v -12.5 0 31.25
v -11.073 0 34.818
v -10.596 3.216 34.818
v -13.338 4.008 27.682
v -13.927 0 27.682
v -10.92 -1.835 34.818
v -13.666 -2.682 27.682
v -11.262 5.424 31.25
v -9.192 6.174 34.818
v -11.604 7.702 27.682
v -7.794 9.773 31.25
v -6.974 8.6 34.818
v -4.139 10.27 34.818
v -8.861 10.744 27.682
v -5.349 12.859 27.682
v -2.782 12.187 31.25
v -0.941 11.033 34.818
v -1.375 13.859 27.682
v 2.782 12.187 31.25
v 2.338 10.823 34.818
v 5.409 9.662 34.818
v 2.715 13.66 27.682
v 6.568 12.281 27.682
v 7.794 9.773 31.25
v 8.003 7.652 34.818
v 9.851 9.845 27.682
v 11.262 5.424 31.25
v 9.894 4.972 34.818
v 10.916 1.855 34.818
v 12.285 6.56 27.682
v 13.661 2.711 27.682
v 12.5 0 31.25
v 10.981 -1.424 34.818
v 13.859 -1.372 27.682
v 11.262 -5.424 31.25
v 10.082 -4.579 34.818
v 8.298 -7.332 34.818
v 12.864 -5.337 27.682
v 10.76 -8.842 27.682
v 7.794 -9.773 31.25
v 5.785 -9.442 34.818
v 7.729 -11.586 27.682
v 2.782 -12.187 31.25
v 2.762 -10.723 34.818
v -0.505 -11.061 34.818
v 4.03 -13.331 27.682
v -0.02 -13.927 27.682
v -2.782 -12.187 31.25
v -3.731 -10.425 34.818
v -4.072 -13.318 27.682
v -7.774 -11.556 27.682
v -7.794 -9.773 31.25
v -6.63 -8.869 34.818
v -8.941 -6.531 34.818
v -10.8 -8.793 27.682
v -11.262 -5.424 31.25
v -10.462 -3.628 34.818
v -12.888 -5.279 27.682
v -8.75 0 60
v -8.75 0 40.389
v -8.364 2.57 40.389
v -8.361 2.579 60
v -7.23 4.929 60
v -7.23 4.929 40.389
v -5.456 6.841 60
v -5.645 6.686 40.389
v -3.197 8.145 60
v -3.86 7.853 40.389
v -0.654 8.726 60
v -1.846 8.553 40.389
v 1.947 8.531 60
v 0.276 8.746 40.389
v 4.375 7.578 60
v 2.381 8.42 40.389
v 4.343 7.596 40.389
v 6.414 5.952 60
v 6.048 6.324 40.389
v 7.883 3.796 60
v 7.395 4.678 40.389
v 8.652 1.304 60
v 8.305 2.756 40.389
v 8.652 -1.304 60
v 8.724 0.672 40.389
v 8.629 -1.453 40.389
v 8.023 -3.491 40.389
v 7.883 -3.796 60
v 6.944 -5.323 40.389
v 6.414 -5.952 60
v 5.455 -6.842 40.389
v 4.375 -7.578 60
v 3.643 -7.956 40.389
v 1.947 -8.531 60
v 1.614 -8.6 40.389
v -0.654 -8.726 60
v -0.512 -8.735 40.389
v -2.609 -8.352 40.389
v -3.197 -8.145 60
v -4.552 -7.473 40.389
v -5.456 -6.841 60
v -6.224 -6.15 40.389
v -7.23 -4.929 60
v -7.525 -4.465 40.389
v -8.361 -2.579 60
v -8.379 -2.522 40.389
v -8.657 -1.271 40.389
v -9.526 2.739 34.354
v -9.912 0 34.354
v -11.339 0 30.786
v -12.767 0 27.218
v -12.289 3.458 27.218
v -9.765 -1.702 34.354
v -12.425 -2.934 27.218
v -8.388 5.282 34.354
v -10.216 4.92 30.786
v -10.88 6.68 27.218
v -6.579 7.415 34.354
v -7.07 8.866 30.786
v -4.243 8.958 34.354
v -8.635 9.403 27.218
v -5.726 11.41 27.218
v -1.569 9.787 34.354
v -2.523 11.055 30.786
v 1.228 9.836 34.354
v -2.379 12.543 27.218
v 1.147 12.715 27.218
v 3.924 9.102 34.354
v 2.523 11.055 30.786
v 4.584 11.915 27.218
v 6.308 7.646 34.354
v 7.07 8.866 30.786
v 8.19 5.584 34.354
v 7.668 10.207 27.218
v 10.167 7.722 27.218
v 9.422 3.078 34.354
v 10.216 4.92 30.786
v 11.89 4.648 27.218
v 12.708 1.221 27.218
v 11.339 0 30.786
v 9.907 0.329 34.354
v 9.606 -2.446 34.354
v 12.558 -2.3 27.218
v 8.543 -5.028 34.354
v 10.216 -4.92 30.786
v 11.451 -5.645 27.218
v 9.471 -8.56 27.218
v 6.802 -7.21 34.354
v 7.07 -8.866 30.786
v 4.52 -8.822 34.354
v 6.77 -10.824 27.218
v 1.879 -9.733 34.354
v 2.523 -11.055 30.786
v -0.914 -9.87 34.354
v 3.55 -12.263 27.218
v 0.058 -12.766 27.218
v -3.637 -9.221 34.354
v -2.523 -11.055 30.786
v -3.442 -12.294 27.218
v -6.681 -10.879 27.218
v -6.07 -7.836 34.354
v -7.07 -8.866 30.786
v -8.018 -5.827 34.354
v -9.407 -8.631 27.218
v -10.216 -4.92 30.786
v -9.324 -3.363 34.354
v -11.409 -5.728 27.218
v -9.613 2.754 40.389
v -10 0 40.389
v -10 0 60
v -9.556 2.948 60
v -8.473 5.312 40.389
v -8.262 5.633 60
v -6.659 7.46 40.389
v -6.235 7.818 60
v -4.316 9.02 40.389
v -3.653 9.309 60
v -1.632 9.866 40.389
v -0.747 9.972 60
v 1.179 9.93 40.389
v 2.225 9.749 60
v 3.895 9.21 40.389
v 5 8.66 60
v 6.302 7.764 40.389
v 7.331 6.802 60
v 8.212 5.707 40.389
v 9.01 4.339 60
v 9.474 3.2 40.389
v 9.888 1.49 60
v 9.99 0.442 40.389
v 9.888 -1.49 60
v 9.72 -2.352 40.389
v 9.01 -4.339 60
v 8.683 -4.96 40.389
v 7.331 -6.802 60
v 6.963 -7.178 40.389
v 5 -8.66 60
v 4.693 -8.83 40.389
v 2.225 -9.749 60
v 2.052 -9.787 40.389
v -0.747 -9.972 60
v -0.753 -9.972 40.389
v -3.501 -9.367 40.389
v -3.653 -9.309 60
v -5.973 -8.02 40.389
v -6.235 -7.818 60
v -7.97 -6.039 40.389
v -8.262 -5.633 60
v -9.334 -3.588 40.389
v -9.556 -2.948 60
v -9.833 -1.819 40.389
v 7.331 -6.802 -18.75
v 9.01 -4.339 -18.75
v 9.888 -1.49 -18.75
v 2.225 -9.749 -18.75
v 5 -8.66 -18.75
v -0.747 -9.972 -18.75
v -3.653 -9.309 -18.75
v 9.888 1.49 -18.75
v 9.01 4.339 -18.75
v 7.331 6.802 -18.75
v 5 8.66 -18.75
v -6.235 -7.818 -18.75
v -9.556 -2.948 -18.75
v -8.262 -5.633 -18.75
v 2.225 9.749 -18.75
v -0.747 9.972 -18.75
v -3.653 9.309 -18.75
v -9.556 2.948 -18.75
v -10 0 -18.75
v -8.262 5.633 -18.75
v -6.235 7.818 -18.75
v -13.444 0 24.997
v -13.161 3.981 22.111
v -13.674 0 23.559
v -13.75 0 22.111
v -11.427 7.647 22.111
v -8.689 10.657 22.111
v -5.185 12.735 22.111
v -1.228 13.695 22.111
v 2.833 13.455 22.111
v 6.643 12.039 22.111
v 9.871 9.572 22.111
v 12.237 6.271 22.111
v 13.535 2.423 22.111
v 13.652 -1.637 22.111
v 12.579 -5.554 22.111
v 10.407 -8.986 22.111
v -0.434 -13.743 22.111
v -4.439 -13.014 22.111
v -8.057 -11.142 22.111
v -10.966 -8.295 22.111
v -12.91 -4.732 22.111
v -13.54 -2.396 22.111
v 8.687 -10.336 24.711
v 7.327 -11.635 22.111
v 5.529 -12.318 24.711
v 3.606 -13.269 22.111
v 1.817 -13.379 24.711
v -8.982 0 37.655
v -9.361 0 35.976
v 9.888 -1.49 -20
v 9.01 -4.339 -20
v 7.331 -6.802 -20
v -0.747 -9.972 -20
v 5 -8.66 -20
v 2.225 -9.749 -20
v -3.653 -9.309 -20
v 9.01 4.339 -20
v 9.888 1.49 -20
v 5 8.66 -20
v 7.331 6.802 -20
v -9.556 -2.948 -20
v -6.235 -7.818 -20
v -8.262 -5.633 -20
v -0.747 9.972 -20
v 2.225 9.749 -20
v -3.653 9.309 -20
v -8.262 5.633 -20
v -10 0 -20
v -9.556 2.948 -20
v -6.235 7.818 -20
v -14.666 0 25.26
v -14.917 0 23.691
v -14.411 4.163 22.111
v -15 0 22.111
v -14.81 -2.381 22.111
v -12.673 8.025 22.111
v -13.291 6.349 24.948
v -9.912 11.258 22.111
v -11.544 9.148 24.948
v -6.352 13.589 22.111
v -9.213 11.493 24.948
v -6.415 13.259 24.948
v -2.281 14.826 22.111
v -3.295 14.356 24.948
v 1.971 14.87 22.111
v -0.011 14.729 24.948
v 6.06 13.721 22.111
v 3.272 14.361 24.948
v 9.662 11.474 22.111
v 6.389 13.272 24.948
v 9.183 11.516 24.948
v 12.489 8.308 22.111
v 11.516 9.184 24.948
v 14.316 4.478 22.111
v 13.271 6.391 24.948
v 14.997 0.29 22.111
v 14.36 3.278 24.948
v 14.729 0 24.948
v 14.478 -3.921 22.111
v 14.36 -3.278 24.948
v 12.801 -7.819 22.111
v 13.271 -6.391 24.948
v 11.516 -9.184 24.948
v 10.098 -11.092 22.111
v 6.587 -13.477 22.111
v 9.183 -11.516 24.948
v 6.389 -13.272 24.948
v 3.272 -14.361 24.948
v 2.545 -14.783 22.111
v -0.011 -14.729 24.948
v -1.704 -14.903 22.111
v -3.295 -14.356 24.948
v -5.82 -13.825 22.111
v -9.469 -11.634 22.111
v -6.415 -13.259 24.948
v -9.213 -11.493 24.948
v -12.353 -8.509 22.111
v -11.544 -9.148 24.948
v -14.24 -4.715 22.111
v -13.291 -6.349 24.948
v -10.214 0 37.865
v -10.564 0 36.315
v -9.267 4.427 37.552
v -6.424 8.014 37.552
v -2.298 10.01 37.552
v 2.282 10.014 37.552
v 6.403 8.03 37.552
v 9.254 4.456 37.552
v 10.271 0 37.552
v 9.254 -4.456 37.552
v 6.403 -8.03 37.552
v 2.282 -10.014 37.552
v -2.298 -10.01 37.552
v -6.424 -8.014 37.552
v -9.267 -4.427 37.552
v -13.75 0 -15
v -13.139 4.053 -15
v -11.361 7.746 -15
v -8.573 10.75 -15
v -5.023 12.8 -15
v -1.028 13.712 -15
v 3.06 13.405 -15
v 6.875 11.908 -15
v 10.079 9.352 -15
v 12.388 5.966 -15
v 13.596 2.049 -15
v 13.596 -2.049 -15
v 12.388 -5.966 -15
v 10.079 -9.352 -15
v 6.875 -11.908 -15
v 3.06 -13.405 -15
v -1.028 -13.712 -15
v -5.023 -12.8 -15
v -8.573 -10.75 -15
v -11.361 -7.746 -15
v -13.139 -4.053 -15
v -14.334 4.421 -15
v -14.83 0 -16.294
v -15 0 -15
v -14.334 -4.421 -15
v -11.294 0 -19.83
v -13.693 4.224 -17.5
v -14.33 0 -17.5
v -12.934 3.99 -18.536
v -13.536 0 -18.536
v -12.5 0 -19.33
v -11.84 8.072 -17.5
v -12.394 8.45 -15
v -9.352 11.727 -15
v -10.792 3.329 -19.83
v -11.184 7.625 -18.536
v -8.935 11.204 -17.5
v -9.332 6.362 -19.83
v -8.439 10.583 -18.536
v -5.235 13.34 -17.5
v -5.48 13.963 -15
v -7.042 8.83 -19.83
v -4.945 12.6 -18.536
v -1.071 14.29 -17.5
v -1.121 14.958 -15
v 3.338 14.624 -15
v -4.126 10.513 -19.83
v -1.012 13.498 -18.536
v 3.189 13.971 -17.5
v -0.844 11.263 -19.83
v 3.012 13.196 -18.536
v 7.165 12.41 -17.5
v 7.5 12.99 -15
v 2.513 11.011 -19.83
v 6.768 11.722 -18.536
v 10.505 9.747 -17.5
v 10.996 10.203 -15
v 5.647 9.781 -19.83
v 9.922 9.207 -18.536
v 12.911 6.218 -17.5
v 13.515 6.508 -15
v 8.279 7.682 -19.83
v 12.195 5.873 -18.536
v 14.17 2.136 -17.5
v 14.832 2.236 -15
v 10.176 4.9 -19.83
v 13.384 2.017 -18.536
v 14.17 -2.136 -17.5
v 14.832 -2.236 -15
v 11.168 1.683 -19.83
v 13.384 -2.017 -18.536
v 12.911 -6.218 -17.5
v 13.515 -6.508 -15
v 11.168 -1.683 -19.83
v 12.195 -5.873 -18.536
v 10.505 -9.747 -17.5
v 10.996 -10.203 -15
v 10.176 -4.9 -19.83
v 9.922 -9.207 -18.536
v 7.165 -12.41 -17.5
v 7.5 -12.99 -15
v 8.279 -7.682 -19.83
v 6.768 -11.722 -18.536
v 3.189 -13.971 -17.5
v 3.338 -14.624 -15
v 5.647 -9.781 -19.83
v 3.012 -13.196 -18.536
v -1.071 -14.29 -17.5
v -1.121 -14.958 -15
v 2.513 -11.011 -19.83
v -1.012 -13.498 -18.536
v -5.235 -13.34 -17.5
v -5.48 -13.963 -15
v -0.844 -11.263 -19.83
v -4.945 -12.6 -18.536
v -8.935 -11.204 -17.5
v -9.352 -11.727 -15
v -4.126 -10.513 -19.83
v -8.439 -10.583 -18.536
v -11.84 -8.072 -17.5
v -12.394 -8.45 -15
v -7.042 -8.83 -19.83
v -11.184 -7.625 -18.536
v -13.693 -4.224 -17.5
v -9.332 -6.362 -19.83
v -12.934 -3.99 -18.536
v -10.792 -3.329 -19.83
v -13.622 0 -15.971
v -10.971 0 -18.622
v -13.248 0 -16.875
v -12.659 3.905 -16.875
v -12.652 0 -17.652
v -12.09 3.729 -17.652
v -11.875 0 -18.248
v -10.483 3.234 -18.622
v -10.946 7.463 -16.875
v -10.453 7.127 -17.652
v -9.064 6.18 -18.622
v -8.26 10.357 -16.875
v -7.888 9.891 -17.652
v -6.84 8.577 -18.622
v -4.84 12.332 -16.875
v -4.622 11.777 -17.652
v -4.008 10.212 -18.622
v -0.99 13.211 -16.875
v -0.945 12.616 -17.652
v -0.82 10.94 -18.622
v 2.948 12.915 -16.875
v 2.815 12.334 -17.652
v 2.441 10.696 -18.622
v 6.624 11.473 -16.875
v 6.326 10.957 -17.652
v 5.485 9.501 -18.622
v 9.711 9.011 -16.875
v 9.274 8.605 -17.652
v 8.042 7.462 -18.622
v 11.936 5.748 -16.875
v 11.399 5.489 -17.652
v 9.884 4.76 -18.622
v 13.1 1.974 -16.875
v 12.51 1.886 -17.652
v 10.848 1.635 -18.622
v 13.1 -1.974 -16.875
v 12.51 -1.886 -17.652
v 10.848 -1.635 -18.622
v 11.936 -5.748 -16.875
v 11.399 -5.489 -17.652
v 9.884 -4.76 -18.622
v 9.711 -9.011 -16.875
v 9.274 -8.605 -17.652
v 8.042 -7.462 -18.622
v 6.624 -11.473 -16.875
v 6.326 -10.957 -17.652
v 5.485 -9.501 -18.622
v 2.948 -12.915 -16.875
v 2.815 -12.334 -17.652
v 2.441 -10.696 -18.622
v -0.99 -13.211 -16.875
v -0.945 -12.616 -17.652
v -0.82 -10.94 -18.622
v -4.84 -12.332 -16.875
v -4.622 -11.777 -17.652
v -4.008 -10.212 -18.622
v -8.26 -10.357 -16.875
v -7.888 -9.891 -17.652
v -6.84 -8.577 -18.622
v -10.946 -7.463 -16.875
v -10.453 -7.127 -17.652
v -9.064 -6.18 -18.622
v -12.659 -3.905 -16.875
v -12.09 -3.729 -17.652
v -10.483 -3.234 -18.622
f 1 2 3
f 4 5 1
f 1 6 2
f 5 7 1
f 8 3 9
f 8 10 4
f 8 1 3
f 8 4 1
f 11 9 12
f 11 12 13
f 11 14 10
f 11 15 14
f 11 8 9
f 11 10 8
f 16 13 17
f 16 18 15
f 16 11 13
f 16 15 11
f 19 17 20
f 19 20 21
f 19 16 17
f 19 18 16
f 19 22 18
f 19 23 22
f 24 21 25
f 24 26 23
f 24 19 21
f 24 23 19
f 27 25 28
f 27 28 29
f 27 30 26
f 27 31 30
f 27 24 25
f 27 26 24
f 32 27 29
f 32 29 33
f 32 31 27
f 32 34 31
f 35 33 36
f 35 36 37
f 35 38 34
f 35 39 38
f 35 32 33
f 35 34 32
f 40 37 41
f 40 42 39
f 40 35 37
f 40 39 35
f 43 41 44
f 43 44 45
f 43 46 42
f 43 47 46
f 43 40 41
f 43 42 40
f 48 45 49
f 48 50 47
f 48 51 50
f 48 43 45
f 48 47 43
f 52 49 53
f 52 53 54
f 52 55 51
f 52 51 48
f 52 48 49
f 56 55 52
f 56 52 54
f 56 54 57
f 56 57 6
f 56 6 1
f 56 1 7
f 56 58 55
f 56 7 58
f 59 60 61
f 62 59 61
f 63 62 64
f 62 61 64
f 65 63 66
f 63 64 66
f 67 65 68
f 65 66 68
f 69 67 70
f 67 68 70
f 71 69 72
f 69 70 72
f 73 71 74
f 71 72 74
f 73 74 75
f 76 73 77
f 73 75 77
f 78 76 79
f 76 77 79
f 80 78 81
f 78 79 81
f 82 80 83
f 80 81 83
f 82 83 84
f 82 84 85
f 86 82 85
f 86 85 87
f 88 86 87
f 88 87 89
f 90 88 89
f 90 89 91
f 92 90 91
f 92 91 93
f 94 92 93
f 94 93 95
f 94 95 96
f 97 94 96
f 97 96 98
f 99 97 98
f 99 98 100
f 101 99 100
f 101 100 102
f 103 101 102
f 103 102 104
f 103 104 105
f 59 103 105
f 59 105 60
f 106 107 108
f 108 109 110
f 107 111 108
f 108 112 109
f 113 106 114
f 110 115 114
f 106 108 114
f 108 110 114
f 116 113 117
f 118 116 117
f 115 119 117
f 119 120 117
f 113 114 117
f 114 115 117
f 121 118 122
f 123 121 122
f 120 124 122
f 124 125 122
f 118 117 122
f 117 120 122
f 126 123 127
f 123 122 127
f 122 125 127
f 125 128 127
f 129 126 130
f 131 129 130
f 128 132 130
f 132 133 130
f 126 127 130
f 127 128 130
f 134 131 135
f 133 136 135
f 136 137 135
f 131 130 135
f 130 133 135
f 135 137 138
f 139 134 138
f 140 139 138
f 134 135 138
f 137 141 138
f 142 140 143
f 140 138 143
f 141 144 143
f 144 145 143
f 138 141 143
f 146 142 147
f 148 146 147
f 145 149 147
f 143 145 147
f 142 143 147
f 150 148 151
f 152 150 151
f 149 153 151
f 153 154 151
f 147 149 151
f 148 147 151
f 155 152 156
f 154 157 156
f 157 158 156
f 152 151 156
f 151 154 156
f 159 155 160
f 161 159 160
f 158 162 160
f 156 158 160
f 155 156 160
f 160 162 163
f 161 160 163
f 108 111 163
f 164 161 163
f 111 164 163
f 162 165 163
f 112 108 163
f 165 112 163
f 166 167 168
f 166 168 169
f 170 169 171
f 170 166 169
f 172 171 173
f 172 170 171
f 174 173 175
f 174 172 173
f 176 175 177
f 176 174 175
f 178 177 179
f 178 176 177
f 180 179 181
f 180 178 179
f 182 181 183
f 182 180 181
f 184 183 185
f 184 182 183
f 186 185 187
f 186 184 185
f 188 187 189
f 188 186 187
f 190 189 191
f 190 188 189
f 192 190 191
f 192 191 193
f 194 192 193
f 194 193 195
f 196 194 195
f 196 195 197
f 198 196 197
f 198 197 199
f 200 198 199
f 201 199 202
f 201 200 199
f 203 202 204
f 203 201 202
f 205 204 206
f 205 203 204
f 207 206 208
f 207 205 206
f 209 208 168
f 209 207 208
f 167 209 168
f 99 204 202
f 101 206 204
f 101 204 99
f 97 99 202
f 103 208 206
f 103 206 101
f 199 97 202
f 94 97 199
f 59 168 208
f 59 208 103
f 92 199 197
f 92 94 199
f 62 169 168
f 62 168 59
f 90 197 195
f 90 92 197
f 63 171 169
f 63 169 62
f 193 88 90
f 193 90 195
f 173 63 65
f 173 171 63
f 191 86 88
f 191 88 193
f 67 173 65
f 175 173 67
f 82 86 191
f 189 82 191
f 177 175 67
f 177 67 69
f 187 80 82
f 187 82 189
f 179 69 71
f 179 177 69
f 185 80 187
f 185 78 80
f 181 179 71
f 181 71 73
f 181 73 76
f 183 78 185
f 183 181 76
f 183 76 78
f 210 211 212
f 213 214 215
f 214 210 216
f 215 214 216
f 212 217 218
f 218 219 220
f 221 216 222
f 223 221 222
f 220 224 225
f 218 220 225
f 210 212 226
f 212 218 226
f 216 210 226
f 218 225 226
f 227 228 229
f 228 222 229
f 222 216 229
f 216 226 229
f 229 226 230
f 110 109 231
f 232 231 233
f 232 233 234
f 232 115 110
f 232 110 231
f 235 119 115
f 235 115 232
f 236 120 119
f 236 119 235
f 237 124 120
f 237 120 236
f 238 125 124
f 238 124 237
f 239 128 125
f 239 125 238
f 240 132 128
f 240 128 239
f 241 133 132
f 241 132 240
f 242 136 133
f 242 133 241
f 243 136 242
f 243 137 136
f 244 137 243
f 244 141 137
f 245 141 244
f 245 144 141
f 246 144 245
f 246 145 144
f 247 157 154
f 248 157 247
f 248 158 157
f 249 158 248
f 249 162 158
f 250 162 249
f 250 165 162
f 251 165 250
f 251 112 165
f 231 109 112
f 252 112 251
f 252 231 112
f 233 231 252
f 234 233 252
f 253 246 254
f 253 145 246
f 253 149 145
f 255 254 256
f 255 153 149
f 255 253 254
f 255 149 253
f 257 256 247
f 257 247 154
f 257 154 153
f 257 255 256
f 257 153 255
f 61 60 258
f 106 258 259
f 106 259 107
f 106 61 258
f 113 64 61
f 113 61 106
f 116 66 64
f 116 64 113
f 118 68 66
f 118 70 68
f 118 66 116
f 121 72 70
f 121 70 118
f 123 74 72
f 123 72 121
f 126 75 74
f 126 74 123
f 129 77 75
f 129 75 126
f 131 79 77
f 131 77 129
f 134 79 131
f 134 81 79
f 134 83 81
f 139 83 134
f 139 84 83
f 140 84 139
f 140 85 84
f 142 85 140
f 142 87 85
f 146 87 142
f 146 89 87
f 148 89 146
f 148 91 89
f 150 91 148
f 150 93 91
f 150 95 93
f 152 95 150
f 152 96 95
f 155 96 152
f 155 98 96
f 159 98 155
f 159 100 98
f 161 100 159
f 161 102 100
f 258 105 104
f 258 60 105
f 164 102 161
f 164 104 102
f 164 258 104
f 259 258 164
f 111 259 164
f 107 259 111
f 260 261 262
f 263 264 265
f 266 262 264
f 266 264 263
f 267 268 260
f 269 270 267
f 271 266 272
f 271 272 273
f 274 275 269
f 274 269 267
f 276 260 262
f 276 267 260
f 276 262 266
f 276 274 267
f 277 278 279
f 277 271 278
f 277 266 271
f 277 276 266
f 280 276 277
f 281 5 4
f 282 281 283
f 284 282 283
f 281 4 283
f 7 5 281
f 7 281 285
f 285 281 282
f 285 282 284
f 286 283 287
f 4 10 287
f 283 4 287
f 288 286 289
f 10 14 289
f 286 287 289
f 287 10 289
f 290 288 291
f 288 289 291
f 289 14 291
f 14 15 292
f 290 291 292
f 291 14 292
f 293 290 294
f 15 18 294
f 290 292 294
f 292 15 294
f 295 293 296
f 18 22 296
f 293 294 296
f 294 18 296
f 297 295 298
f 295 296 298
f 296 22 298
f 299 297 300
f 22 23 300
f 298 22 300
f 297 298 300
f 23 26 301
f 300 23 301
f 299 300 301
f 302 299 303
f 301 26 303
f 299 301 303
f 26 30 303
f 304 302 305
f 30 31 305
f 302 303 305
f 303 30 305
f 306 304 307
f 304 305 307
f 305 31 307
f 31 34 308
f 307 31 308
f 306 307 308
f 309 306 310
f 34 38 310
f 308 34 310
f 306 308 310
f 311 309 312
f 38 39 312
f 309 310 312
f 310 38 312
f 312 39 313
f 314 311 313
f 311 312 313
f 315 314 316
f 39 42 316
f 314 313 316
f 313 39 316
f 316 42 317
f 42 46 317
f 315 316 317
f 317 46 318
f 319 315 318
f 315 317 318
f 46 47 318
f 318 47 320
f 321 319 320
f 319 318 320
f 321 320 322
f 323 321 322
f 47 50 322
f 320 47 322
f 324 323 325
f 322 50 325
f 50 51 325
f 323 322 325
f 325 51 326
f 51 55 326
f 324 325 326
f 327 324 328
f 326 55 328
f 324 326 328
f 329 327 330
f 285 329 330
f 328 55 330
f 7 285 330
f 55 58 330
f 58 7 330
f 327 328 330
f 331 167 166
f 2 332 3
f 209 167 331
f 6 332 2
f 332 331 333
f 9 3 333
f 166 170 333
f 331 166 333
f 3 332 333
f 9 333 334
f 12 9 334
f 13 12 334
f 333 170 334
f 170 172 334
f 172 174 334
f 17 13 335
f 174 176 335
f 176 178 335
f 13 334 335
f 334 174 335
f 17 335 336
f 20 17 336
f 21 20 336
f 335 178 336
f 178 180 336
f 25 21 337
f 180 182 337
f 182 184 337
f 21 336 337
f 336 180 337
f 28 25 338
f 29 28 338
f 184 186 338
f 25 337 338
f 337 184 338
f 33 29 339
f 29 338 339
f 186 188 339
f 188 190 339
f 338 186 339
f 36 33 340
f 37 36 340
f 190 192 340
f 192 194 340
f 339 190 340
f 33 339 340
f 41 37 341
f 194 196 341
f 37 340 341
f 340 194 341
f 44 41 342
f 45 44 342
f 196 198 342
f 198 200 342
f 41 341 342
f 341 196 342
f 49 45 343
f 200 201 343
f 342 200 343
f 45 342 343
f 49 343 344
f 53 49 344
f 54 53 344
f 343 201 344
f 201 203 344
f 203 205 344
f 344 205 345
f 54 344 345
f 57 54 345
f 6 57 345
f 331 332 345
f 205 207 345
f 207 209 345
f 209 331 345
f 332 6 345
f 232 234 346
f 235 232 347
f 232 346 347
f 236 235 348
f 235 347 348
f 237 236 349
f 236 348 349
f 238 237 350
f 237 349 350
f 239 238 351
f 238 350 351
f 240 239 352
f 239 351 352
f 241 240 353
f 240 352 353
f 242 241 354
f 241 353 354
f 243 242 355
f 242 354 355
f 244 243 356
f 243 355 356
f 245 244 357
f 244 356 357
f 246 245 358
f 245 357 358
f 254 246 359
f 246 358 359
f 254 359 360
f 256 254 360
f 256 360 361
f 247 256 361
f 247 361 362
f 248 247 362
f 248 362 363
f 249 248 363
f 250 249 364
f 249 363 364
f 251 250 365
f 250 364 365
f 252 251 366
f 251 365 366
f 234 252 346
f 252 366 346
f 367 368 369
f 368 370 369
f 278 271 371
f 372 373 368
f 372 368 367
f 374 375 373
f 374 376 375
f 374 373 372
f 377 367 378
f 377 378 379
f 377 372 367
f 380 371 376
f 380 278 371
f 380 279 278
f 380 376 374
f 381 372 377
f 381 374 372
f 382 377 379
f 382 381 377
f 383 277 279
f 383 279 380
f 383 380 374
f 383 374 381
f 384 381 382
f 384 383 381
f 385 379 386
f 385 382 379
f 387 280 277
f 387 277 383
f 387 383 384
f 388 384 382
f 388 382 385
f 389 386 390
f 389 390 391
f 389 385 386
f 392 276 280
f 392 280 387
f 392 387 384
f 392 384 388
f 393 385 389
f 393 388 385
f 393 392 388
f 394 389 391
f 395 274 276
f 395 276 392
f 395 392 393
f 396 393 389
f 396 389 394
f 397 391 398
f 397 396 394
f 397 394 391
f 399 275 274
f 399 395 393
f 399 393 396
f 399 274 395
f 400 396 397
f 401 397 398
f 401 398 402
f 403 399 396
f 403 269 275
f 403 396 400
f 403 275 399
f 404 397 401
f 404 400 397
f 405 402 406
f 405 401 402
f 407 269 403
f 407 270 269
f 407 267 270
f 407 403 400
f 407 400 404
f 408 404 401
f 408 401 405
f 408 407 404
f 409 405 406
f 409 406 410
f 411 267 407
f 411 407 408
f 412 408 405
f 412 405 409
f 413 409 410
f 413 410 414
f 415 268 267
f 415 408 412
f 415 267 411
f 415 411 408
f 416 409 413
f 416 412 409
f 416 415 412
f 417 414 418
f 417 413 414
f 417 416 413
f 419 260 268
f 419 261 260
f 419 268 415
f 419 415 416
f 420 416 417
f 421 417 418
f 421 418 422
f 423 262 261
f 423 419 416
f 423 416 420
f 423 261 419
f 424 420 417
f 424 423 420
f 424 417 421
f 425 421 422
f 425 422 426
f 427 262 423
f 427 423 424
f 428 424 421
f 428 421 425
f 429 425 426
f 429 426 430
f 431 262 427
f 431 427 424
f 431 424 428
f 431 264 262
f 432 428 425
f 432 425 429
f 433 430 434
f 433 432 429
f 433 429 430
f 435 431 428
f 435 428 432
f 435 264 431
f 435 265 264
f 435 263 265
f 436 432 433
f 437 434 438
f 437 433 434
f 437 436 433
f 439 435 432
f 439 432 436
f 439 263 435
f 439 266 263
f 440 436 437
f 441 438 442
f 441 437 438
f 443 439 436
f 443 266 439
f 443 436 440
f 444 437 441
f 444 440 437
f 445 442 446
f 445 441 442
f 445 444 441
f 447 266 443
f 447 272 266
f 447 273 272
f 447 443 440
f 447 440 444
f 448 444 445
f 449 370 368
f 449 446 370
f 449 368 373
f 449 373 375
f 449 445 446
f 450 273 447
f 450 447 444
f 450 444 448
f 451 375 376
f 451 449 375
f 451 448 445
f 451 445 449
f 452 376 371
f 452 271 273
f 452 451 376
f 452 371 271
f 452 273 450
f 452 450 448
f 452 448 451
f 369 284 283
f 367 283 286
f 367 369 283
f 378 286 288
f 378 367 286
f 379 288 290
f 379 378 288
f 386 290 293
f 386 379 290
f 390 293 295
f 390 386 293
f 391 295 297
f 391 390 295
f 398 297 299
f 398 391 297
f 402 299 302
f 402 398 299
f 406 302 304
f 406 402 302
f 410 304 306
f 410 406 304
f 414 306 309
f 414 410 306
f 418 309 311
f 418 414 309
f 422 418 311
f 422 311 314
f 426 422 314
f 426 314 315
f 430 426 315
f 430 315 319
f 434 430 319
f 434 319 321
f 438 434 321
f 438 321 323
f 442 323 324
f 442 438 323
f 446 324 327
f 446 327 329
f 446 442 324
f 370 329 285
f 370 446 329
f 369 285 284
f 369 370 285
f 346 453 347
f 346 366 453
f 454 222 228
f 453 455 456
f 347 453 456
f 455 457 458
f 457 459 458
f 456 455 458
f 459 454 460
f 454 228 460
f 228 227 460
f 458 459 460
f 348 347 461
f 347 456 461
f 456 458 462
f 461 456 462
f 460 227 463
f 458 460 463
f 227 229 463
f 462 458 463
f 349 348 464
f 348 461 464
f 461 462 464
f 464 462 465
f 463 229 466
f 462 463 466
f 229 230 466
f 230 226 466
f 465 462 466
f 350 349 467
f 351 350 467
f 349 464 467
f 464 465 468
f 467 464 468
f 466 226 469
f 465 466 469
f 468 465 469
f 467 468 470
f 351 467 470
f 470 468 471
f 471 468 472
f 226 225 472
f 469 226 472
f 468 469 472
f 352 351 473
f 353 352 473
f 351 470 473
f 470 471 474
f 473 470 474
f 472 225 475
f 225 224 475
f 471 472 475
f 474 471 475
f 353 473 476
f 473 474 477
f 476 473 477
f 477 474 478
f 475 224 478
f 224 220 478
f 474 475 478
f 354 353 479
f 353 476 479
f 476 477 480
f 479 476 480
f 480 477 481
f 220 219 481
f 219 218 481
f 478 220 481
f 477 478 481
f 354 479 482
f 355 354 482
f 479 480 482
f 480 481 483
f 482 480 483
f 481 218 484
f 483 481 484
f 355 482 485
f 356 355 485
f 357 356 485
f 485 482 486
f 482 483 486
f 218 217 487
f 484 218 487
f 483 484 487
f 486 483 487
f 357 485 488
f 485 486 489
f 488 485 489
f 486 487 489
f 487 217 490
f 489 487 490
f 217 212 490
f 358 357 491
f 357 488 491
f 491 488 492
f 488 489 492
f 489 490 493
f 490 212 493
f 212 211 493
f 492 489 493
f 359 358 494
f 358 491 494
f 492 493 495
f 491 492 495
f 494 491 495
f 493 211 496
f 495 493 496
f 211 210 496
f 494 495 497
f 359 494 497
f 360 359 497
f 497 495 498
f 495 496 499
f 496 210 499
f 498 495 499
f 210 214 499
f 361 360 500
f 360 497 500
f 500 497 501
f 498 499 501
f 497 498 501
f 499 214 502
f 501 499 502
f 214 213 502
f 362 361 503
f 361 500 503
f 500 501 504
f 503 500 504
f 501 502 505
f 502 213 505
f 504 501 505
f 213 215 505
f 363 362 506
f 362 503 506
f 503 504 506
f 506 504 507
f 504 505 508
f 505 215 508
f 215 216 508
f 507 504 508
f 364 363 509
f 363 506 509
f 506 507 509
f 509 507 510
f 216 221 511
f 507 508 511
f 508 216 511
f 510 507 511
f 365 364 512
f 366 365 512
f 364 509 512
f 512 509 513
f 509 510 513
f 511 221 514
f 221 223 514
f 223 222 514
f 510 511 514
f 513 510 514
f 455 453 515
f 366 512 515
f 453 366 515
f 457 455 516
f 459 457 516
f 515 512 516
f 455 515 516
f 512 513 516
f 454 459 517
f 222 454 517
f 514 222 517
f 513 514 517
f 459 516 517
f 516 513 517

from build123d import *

# Parameters (mm, degrees)
F3_R = 15
F4_R = 5
F5_T = -1.25


with BuildPart() as f2:
    # F1 (on Front) → F2 (revolve)
    with BuildSketch(Plane.XZ):
        Polygon((-15, -20), (0, -20), (0, 20), (0, 60), (-10, 60), (-10, 37.5), (-15, 25), align=None)
    revolve(axis=Axis((0, 0, 0), (0, 0, -1)))

    # F3
    f3_edges = [f2.edges().sort_by_distance(p)[0] for p in [
        (15, 0, 25),
        (10, 0, 37.5),
    ]]
    fillet(f3_edges, radius=F3_R)

    # F4
    f4_edges = [f2.edges().sort_by_distance(p)[0] for p in [
        (15, 0, -20),
    ]]
    fillet(f4_edges, radius=F4_R)

    # F5
    f5_openings = [f2.faces().sort_by_distance(p)[0] for p in [
        (0, 0, 60),
    ]]
    offset(amount=F5_T, openings=f5_openings)


solid = f2.part
